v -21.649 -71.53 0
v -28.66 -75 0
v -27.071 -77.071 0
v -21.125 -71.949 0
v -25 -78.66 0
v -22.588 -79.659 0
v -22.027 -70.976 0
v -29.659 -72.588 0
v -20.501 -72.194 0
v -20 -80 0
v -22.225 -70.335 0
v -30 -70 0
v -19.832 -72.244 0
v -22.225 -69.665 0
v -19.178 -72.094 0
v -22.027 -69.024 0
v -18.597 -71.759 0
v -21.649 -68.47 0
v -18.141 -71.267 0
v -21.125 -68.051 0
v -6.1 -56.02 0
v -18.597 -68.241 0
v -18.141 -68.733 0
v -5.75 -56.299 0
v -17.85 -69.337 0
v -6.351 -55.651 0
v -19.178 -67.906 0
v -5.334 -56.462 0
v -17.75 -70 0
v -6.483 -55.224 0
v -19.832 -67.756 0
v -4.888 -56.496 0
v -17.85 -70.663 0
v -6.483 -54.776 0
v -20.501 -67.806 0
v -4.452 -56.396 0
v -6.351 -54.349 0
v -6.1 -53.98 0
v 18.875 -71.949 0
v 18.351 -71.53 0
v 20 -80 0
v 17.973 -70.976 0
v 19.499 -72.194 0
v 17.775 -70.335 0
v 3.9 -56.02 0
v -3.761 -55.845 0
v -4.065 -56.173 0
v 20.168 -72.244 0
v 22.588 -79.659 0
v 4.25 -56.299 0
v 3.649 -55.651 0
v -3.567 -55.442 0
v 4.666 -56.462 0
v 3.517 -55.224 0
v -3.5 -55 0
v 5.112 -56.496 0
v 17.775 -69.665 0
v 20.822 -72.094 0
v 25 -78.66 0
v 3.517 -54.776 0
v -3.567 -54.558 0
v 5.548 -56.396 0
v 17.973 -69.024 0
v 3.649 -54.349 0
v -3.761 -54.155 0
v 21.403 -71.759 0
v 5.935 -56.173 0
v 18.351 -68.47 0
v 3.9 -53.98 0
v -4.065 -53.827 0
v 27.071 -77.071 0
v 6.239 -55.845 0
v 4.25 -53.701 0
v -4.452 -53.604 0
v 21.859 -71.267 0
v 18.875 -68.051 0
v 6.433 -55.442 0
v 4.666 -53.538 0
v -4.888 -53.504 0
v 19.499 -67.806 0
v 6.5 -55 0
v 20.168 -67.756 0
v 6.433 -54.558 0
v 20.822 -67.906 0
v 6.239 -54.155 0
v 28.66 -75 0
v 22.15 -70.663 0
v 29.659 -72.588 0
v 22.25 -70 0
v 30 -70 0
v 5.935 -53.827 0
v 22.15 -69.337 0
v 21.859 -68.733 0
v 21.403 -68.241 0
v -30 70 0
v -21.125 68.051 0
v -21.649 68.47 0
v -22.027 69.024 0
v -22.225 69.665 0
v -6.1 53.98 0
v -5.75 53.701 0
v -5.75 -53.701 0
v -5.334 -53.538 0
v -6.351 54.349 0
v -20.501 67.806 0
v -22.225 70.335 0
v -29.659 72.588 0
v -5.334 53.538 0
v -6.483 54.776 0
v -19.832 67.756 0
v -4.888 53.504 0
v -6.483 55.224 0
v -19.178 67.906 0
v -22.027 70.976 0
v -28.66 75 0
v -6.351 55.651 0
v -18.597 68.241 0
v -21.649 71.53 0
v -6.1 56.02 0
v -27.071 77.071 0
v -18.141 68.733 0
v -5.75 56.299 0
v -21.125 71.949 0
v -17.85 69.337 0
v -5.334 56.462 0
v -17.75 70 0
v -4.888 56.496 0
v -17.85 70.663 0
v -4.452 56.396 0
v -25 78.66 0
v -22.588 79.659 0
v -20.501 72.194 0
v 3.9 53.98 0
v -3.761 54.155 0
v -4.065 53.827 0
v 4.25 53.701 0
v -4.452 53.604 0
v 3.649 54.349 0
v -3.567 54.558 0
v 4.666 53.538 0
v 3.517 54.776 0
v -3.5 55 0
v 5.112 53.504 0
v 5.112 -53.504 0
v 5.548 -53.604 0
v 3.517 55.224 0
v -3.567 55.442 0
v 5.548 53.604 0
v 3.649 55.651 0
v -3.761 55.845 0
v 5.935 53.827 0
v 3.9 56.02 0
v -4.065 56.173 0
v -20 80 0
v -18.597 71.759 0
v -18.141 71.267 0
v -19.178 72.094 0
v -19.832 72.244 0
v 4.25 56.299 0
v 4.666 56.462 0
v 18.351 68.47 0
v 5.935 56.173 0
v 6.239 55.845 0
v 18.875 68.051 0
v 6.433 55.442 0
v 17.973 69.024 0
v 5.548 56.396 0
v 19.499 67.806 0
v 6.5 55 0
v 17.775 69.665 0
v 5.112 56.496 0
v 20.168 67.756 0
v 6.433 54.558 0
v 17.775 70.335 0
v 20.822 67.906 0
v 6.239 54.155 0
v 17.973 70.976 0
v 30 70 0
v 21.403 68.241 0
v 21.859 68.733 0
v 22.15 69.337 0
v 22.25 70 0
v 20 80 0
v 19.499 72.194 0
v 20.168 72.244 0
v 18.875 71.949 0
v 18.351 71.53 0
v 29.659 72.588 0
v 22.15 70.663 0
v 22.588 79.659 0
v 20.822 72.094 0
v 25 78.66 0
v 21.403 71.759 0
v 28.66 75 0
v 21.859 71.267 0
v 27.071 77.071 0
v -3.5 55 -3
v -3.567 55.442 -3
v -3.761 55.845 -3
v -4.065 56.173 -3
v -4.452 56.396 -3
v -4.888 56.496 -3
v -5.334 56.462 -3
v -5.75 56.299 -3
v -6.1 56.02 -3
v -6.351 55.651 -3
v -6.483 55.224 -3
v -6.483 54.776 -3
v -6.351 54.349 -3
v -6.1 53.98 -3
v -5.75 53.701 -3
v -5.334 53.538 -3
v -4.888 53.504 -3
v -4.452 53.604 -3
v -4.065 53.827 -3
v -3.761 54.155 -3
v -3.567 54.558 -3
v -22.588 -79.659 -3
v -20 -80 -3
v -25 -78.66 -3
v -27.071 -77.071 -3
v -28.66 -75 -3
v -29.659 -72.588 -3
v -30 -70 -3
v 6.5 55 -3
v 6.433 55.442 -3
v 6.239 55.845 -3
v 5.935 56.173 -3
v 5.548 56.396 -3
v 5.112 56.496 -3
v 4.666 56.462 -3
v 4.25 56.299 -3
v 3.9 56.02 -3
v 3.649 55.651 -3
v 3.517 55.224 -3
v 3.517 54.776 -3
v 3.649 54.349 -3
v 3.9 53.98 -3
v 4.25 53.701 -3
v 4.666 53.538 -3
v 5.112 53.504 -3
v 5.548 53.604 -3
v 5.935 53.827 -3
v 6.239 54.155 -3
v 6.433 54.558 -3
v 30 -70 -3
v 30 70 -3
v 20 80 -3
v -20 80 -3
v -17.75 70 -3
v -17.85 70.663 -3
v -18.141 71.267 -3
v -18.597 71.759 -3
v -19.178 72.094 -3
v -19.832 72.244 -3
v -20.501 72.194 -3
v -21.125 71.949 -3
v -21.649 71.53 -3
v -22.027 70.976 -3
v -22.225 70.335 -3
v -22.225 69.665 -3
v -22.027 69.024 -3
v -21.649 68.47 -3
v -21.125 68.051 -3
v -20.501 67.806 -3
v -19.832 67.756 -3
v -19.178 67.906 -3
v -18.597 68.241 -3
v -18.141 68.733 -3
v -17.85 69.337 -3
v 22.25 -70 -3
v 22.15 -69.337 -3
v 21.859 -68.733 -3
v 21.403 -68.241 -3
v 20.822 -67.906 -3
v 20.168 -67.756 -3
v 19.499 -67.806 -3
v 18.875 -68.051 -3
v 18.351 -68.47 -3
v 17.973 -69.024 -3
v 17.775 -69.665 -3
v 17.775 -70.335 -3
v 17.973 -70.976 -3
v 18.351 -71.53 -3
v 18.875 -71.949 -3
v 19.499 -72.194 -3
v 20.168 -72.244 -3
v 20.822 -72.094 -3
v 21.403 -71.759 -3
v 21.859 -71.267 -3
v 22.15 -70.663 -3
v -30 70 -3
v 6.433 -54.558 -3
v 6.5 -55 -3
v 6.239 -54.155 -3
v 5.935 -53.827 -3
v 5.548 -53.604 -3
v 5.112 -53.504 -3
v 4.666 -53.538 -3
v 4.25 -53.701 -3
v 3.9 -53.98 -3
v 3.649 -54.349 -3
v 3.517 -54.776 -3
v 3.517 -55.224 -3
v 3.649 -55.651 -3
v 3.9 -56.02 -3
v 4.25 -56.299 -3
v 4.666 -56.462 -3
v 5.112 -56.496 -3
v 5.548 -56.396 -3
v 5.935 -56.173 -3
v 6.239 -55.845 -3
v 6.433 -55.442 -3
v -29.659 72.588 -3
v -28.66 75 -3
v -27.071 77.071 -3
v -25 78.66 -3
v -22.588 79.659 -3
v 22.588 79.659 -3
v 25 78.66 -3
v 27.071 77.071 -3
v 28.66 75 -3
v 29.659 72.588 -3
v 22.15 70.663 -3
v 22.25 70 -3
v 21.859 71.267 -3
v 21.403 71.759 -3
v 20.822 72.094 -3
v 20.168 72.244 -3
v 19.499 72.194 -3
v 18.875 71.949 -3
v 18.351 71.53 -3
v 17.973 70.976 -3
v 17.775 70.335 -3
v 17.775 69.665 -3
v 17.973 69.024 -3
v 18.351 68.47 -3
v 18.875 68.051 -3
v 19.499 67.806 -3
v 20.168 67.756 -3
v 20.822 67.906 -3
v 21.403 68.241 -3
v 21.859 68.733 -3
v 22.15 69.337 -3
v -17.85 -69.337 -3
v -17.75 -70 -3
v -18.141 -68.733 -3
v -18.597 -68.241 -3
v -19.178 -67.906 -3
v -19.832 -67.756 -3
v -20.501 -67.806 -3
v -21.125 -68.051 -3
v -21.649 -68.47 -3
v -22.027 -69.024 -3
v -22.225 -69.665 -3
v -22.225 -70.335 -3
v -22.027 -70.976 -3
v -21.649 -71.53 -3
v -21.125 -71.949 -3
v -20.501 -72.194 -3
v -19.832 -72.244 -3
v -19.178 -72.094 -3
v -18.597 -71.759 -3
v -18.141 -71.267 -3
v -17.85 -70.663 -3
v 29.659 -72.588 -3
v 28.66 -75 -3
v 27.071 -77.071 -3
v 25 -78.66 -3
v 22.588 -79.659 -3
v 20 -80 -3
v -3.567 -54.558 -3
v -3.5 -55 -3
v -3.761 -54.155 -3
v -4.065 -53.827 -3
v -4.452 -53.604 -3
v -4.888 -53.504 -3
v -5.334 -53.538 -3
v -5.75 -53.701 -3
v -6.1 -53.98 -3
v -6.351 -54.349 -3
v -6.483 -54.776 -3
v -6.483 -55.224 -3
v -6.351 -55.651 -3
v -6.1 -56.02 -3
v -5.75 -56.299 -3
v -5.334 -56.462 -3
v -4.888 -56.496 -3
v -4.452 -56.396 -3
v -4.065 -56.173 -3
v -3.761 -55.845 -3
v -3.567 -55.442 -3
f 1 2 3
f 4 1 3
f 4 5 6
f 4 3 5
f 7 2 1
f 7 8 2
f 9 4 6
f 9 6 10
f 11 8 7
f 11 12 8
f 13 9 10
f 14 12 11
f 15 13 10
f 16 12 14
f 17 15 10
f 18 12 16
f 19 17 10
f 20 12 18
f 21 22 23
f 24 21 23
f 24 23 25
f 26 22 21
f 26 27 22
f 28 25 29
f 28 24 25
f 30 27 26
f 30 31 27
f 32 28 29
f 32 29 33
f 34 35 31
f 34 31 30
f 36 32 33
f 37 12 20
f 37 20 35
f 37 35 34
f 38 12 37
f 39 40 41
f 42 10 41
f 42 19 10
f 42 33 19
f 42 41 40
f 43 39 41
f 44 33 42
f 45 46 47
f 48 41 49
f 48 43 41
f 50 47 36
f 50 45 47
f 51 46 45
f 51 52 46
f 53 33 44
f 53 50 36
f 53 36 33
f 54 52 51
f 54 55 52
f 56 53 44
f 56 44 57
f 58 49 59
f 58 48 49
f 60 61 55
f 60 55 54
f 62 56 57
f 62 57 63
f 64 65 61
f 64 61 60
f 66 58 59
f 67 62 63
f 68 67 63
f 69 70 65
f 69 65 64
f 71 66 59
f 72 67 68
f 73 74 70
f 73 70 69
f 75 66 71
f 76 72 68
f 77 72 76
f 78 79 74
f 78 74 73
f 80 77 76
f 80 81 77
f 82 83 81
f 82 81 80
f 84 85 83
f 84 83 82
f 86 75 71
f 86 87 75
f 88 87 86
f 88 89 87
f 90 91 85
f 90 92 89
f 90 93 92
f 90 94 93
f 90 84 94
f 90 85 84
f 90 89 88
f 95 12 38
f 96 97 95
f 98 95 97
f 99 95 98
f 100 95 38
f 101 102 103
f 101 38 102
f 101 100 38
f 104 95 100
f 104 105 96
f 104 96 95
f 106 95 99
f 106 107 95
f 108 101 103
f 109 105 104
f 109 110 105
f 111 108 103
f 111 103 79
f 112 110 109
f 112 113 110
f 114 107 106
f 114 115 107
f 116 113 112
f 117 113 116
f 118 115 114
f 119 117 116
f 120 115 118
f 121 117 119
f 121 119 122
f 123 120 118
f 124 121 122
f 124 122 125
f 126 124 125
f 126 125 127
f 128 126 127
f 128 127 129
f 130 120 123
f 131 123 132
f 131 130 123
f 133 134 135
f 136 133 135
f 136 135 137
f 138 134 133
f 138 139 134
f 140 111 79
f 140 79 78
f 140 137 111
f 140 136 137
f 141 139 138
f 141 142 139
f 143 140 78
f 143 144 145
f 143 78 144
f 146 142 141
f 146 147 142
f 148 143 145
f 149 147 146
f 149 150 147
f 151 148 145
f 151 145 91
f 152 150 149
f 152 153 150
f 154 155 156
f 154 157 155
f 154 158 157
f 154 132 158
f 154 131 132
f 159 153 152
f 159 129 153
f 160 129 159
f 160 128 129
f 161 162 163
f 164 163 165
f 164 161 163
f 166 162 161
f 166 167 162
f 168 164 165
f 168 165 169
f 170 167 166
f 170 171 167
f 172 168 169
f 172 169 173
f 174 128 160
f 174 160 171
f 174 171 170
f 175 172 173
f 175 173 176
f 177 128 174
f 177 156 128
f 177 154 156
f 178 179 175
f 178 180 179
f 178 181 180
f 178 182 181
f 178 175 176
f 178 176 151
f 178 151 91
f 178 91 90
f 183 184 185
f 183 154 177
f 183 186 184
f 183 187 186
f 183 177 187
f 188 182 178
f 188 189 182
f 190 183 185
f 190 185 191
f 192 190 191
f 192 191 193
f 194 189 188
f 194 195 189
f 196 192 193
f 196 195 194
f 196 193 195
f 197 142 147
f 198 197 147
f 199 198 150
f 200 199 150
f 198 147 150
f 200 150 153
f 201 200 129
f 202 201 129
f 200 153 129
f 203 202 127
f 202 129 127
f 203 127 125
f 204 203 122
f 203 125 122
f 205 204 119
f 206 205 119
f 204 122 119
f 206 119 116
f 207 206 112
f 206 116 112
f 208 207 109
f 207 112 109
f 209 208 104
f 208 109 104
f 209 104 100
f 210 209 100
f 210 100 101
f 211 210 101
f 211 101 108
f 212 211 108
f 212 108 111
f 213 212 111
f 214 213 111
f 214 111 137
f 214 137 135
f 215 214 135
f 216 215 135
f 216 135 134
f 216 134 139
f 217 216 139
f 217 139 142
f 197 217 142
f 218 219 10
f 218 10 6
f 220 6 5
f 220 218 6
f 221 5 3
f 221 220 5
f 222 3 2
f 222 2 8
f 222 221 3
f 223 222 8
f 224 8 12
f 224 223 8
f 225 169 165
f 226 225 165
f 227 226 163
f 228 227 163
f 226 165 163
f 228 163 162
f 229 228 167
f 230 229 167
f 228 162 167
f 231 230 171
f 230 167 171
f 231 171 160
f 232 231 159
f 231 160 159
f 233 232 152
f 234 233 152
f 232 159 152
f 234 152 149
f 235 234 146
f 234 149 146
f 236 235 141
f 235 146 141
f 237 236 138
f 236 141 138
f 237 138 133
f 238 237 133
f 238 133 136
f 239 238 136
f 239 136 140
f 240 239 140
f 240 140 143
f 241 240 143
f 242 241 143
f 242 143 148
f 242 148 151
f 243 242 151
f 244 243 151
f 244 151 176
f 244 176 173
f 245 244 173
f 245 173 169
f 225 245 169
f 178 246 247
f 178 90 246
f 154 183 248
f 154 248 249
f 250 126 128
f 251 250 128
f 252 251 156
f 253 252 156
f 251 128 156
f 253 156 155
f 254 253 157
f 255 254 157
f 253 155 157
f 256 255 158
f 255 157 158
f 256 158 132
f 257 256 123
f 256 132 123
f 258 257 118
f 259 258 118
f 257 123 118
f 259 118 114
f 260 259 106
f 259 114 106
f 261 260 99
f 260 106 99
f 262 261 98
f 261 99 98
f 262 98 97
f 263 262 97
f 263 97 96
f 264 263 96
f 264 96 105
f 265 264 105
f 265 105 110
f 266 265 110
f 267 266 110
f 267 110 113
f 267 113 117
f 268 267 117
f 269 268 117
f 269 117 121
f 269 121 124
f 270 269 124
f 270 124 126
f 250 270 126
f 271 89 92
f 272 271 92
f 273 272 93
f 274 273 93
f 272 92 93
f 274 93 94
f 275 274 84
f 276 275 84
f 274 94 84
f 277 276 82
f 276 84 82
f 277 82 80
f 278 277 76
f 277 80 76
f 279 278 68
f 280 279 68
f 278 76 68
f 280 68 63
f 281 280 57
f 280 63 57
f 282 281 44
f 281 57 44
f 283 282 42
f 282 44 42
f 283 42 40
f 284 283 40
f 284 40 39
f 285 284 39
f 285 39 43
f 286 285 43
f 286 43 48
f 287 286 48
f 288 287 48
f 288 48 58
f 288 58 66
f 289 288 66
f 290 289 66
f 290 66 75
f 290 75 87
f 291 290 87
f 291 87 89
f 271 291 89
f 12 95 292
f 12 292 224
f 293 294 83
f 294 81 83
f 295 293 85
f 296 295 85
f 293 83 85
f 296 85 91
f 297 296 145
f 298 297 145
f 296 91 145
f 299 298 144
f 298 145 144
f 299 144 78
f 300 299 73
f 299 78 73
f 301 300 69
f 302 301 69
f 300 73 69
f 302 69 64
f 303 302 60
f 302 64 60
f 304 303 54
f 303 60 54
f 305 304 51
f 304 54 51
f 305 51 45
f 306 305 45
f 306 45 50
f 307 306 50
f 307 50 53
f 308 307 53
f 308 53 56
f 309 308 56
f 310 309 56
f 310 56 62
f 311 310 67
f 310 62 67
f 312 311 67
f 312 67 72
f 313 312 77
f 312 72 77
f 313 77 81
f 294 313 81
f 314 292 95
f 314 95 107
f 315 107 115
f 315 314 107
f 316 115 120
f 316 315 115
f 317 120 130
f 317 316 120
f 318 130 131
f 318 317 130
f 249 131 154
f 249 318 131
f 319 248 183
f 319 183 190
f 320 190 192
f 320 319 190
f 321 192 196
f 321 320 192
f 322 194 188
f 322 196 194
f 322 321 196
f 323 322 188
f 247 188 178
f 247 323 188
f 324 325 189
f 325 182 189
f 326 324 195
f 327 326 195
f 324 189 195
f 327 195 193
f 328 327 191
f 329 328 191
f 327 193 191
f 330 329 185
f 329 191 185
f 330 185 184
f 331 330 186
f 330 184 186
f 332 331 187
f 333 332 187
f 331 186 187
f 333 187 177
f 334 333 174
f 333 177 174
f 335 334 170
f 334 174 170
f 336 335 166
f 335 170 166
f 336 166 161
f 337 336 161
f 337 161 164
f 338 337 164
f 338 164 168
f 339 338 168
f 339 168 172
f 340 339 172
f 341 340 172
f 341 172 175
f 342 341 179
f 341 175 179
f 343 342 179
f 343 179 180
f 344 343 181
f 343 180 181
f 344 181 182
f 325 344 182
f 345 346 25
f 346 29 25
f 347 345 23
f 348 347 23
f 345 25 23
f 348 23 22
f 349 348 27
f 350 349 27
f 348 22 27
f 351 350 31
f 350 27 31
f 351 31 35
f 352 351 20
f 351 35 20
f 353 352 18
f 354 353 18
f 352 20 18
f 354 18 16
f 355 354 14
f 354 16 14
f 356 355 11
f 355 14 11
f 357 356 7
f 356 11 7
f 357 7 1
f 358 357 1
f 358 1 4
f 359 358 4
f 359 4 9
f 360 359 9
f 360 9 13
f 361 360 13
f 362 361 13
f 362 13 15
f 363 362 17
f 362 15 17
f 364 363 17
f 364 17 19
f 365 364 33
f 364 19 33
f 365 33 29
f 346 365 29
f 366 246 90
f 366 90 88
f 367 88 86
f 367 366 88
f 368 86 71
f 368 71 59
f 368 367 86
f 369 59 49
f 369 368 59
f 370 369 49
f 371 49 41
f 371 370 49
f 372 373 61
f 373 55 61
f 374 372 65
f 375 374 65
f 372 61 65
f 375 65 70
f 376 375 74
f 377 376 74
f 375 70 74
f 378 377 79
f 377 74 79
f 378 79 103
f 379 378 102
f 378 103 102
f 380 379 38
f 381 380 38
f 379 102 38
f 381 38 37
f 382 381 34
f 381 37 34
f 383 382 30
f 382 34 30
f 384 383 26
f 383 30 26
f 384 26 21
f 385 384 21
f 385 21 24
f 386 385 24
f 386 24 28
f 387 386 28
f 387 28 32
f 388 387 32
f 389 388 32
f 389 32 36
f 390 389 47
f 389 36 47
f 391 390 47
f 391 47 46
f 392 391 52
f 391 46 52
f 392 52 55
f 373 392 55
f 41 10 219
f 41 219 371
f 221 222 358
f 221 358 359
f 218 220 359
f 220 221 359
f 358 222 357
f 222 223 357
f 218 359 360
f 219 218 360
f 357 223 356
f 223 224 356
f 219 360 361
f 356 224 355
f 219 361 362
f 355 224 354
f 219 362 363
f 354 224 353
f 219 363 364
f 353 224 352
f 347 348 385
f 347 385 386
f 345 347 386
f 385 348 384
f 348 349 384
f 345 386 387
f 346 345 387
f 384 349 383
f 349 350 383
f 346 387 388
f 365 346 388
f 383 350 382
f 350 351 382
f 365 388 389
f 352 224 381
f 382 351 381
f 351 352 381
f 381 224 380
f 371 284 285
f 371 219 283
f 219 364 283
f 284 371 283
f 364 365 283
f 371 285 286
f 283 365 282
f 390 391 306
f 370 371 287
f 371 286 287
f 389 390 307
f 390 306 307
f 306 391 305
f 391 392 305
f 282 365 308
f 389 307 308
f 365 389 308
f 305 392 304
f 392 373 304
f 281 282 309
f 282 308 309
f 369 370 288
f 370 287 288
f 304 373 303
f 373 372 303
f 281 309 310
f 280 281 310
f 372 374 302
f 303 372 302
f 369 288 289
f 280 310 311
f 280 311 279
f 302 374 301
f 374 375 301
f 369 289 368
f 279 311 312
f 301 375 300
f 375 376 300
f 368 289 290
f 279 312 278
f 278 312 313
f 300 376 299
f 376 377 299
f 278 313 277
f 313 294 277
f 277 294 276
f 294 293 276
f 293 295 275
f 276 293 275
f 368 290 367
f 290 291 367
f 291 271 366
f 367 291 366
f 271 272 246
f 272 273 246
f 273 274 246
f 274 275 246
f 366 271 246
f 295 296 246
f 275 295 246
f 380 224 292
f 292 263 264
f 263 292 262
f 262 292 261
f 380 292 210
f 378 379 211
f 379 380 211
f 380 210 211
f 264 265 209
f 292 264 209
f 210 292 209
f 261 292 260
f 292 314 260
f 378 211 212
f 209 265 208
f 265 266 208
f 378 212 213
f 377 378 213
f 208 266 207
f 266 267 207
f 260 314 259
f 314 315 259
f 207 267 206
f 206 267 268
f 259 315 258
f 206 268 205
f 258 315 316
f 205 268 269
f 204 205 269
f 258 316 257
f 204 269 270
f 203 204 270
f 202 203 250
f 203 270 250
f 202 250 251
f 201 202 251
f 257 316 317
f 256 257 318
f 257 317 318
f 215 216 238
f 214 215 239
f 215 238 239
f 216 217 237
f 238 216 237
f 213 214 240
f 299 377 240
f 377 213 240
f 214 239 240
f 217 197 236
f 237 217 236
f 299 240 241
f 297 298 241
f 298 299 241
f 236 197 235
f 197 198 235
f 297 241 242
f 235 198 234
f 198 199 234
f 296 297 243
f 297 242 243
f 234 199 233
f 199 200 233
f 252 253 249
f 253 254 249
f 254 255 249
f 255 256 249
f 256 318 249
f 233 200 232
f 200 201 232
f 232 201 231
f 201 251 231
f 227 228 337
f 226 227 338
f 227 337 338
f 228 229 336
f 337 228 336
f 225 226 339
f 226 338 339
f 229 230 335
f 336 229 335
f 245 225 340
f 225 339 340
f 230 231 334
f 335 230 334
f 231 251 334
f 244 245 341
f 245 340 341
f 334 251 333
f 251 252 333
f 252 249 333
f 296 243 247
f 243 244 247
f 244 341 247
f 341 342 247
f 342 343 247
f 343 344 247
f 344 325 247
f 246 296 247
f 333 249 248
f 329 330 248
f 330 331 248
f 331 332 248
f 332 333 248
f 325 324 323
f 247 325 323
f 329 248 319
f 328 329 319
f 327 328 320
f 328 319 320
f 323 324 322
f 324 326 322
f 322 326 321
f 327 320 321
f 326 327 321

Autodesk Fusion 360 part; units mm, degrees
sketch "Sketch1" plane through (0, 0, 0) normal (0, 0, 1) x (1, 0, 0)
  line L0 (30, 80) -> (-30, 80)
  line L1 (-30, 80) -> (-30, -80)
  line L2 (-30, -80) -> (30, -80)
  line L3 (30, -80) -> (30, 80)
  line L4 (30, 80) -> (-30, -80) construction
  line L5 (-30, 80) -> (30, -80) construction
  line L6 (20, 70) -> (-20, 70) construction
  line L7 (-20, 70) -> (-20, -70) construction
  line L8 (-20, -70) -> (20, -70) construction
  line L9 (20, -70) -> (20, 70) construction
  line L10 (20, 70) -> (-20, -70) construction
  line L11 (-20, 70) -> (20, -70) construction
  line L12 (0, 0) -> (30, 0) construction
  circle A0 centre (20, 70) radius 2.25
  circle A1 centre (-20, 70) radius 2.25
  circle A2 centre (-20, -70) radius 2.25
  circle A3 centre (20, -70) radius 2.25
  line L13 (-30, 55) -> (30, 55) construction
  line L14 (0, 0) -> (0, 80) construction
  circle A4 centre (5, 55) radius 1.5
  circle A5 centre (-5, 55) radius 1.5
  circle A6 centre (5, -55) radius 1.5
  circle A7 centre (-5, -55) radius 1.5
  dimension "d1" = 160
  dimension "d2" = 60
  dimension "d3" = 40
  dimension "d4" = 140
  dimension "d5" = 4.5
  dimension "d6" = 4.5
  dimension "d11" = 3
  dimension "d12" = 5
  dimension "d13" = 55
extrude "Extrude1" add sketch "Sketch1" against normal blind 3
fillet "Fillet1" radius 10 4 edges at (-30, -80, -1.5) (30, -80, -1.5) (30, 80, -1.5) (-30, 80, -1.5)
equation "d6 = d5"
